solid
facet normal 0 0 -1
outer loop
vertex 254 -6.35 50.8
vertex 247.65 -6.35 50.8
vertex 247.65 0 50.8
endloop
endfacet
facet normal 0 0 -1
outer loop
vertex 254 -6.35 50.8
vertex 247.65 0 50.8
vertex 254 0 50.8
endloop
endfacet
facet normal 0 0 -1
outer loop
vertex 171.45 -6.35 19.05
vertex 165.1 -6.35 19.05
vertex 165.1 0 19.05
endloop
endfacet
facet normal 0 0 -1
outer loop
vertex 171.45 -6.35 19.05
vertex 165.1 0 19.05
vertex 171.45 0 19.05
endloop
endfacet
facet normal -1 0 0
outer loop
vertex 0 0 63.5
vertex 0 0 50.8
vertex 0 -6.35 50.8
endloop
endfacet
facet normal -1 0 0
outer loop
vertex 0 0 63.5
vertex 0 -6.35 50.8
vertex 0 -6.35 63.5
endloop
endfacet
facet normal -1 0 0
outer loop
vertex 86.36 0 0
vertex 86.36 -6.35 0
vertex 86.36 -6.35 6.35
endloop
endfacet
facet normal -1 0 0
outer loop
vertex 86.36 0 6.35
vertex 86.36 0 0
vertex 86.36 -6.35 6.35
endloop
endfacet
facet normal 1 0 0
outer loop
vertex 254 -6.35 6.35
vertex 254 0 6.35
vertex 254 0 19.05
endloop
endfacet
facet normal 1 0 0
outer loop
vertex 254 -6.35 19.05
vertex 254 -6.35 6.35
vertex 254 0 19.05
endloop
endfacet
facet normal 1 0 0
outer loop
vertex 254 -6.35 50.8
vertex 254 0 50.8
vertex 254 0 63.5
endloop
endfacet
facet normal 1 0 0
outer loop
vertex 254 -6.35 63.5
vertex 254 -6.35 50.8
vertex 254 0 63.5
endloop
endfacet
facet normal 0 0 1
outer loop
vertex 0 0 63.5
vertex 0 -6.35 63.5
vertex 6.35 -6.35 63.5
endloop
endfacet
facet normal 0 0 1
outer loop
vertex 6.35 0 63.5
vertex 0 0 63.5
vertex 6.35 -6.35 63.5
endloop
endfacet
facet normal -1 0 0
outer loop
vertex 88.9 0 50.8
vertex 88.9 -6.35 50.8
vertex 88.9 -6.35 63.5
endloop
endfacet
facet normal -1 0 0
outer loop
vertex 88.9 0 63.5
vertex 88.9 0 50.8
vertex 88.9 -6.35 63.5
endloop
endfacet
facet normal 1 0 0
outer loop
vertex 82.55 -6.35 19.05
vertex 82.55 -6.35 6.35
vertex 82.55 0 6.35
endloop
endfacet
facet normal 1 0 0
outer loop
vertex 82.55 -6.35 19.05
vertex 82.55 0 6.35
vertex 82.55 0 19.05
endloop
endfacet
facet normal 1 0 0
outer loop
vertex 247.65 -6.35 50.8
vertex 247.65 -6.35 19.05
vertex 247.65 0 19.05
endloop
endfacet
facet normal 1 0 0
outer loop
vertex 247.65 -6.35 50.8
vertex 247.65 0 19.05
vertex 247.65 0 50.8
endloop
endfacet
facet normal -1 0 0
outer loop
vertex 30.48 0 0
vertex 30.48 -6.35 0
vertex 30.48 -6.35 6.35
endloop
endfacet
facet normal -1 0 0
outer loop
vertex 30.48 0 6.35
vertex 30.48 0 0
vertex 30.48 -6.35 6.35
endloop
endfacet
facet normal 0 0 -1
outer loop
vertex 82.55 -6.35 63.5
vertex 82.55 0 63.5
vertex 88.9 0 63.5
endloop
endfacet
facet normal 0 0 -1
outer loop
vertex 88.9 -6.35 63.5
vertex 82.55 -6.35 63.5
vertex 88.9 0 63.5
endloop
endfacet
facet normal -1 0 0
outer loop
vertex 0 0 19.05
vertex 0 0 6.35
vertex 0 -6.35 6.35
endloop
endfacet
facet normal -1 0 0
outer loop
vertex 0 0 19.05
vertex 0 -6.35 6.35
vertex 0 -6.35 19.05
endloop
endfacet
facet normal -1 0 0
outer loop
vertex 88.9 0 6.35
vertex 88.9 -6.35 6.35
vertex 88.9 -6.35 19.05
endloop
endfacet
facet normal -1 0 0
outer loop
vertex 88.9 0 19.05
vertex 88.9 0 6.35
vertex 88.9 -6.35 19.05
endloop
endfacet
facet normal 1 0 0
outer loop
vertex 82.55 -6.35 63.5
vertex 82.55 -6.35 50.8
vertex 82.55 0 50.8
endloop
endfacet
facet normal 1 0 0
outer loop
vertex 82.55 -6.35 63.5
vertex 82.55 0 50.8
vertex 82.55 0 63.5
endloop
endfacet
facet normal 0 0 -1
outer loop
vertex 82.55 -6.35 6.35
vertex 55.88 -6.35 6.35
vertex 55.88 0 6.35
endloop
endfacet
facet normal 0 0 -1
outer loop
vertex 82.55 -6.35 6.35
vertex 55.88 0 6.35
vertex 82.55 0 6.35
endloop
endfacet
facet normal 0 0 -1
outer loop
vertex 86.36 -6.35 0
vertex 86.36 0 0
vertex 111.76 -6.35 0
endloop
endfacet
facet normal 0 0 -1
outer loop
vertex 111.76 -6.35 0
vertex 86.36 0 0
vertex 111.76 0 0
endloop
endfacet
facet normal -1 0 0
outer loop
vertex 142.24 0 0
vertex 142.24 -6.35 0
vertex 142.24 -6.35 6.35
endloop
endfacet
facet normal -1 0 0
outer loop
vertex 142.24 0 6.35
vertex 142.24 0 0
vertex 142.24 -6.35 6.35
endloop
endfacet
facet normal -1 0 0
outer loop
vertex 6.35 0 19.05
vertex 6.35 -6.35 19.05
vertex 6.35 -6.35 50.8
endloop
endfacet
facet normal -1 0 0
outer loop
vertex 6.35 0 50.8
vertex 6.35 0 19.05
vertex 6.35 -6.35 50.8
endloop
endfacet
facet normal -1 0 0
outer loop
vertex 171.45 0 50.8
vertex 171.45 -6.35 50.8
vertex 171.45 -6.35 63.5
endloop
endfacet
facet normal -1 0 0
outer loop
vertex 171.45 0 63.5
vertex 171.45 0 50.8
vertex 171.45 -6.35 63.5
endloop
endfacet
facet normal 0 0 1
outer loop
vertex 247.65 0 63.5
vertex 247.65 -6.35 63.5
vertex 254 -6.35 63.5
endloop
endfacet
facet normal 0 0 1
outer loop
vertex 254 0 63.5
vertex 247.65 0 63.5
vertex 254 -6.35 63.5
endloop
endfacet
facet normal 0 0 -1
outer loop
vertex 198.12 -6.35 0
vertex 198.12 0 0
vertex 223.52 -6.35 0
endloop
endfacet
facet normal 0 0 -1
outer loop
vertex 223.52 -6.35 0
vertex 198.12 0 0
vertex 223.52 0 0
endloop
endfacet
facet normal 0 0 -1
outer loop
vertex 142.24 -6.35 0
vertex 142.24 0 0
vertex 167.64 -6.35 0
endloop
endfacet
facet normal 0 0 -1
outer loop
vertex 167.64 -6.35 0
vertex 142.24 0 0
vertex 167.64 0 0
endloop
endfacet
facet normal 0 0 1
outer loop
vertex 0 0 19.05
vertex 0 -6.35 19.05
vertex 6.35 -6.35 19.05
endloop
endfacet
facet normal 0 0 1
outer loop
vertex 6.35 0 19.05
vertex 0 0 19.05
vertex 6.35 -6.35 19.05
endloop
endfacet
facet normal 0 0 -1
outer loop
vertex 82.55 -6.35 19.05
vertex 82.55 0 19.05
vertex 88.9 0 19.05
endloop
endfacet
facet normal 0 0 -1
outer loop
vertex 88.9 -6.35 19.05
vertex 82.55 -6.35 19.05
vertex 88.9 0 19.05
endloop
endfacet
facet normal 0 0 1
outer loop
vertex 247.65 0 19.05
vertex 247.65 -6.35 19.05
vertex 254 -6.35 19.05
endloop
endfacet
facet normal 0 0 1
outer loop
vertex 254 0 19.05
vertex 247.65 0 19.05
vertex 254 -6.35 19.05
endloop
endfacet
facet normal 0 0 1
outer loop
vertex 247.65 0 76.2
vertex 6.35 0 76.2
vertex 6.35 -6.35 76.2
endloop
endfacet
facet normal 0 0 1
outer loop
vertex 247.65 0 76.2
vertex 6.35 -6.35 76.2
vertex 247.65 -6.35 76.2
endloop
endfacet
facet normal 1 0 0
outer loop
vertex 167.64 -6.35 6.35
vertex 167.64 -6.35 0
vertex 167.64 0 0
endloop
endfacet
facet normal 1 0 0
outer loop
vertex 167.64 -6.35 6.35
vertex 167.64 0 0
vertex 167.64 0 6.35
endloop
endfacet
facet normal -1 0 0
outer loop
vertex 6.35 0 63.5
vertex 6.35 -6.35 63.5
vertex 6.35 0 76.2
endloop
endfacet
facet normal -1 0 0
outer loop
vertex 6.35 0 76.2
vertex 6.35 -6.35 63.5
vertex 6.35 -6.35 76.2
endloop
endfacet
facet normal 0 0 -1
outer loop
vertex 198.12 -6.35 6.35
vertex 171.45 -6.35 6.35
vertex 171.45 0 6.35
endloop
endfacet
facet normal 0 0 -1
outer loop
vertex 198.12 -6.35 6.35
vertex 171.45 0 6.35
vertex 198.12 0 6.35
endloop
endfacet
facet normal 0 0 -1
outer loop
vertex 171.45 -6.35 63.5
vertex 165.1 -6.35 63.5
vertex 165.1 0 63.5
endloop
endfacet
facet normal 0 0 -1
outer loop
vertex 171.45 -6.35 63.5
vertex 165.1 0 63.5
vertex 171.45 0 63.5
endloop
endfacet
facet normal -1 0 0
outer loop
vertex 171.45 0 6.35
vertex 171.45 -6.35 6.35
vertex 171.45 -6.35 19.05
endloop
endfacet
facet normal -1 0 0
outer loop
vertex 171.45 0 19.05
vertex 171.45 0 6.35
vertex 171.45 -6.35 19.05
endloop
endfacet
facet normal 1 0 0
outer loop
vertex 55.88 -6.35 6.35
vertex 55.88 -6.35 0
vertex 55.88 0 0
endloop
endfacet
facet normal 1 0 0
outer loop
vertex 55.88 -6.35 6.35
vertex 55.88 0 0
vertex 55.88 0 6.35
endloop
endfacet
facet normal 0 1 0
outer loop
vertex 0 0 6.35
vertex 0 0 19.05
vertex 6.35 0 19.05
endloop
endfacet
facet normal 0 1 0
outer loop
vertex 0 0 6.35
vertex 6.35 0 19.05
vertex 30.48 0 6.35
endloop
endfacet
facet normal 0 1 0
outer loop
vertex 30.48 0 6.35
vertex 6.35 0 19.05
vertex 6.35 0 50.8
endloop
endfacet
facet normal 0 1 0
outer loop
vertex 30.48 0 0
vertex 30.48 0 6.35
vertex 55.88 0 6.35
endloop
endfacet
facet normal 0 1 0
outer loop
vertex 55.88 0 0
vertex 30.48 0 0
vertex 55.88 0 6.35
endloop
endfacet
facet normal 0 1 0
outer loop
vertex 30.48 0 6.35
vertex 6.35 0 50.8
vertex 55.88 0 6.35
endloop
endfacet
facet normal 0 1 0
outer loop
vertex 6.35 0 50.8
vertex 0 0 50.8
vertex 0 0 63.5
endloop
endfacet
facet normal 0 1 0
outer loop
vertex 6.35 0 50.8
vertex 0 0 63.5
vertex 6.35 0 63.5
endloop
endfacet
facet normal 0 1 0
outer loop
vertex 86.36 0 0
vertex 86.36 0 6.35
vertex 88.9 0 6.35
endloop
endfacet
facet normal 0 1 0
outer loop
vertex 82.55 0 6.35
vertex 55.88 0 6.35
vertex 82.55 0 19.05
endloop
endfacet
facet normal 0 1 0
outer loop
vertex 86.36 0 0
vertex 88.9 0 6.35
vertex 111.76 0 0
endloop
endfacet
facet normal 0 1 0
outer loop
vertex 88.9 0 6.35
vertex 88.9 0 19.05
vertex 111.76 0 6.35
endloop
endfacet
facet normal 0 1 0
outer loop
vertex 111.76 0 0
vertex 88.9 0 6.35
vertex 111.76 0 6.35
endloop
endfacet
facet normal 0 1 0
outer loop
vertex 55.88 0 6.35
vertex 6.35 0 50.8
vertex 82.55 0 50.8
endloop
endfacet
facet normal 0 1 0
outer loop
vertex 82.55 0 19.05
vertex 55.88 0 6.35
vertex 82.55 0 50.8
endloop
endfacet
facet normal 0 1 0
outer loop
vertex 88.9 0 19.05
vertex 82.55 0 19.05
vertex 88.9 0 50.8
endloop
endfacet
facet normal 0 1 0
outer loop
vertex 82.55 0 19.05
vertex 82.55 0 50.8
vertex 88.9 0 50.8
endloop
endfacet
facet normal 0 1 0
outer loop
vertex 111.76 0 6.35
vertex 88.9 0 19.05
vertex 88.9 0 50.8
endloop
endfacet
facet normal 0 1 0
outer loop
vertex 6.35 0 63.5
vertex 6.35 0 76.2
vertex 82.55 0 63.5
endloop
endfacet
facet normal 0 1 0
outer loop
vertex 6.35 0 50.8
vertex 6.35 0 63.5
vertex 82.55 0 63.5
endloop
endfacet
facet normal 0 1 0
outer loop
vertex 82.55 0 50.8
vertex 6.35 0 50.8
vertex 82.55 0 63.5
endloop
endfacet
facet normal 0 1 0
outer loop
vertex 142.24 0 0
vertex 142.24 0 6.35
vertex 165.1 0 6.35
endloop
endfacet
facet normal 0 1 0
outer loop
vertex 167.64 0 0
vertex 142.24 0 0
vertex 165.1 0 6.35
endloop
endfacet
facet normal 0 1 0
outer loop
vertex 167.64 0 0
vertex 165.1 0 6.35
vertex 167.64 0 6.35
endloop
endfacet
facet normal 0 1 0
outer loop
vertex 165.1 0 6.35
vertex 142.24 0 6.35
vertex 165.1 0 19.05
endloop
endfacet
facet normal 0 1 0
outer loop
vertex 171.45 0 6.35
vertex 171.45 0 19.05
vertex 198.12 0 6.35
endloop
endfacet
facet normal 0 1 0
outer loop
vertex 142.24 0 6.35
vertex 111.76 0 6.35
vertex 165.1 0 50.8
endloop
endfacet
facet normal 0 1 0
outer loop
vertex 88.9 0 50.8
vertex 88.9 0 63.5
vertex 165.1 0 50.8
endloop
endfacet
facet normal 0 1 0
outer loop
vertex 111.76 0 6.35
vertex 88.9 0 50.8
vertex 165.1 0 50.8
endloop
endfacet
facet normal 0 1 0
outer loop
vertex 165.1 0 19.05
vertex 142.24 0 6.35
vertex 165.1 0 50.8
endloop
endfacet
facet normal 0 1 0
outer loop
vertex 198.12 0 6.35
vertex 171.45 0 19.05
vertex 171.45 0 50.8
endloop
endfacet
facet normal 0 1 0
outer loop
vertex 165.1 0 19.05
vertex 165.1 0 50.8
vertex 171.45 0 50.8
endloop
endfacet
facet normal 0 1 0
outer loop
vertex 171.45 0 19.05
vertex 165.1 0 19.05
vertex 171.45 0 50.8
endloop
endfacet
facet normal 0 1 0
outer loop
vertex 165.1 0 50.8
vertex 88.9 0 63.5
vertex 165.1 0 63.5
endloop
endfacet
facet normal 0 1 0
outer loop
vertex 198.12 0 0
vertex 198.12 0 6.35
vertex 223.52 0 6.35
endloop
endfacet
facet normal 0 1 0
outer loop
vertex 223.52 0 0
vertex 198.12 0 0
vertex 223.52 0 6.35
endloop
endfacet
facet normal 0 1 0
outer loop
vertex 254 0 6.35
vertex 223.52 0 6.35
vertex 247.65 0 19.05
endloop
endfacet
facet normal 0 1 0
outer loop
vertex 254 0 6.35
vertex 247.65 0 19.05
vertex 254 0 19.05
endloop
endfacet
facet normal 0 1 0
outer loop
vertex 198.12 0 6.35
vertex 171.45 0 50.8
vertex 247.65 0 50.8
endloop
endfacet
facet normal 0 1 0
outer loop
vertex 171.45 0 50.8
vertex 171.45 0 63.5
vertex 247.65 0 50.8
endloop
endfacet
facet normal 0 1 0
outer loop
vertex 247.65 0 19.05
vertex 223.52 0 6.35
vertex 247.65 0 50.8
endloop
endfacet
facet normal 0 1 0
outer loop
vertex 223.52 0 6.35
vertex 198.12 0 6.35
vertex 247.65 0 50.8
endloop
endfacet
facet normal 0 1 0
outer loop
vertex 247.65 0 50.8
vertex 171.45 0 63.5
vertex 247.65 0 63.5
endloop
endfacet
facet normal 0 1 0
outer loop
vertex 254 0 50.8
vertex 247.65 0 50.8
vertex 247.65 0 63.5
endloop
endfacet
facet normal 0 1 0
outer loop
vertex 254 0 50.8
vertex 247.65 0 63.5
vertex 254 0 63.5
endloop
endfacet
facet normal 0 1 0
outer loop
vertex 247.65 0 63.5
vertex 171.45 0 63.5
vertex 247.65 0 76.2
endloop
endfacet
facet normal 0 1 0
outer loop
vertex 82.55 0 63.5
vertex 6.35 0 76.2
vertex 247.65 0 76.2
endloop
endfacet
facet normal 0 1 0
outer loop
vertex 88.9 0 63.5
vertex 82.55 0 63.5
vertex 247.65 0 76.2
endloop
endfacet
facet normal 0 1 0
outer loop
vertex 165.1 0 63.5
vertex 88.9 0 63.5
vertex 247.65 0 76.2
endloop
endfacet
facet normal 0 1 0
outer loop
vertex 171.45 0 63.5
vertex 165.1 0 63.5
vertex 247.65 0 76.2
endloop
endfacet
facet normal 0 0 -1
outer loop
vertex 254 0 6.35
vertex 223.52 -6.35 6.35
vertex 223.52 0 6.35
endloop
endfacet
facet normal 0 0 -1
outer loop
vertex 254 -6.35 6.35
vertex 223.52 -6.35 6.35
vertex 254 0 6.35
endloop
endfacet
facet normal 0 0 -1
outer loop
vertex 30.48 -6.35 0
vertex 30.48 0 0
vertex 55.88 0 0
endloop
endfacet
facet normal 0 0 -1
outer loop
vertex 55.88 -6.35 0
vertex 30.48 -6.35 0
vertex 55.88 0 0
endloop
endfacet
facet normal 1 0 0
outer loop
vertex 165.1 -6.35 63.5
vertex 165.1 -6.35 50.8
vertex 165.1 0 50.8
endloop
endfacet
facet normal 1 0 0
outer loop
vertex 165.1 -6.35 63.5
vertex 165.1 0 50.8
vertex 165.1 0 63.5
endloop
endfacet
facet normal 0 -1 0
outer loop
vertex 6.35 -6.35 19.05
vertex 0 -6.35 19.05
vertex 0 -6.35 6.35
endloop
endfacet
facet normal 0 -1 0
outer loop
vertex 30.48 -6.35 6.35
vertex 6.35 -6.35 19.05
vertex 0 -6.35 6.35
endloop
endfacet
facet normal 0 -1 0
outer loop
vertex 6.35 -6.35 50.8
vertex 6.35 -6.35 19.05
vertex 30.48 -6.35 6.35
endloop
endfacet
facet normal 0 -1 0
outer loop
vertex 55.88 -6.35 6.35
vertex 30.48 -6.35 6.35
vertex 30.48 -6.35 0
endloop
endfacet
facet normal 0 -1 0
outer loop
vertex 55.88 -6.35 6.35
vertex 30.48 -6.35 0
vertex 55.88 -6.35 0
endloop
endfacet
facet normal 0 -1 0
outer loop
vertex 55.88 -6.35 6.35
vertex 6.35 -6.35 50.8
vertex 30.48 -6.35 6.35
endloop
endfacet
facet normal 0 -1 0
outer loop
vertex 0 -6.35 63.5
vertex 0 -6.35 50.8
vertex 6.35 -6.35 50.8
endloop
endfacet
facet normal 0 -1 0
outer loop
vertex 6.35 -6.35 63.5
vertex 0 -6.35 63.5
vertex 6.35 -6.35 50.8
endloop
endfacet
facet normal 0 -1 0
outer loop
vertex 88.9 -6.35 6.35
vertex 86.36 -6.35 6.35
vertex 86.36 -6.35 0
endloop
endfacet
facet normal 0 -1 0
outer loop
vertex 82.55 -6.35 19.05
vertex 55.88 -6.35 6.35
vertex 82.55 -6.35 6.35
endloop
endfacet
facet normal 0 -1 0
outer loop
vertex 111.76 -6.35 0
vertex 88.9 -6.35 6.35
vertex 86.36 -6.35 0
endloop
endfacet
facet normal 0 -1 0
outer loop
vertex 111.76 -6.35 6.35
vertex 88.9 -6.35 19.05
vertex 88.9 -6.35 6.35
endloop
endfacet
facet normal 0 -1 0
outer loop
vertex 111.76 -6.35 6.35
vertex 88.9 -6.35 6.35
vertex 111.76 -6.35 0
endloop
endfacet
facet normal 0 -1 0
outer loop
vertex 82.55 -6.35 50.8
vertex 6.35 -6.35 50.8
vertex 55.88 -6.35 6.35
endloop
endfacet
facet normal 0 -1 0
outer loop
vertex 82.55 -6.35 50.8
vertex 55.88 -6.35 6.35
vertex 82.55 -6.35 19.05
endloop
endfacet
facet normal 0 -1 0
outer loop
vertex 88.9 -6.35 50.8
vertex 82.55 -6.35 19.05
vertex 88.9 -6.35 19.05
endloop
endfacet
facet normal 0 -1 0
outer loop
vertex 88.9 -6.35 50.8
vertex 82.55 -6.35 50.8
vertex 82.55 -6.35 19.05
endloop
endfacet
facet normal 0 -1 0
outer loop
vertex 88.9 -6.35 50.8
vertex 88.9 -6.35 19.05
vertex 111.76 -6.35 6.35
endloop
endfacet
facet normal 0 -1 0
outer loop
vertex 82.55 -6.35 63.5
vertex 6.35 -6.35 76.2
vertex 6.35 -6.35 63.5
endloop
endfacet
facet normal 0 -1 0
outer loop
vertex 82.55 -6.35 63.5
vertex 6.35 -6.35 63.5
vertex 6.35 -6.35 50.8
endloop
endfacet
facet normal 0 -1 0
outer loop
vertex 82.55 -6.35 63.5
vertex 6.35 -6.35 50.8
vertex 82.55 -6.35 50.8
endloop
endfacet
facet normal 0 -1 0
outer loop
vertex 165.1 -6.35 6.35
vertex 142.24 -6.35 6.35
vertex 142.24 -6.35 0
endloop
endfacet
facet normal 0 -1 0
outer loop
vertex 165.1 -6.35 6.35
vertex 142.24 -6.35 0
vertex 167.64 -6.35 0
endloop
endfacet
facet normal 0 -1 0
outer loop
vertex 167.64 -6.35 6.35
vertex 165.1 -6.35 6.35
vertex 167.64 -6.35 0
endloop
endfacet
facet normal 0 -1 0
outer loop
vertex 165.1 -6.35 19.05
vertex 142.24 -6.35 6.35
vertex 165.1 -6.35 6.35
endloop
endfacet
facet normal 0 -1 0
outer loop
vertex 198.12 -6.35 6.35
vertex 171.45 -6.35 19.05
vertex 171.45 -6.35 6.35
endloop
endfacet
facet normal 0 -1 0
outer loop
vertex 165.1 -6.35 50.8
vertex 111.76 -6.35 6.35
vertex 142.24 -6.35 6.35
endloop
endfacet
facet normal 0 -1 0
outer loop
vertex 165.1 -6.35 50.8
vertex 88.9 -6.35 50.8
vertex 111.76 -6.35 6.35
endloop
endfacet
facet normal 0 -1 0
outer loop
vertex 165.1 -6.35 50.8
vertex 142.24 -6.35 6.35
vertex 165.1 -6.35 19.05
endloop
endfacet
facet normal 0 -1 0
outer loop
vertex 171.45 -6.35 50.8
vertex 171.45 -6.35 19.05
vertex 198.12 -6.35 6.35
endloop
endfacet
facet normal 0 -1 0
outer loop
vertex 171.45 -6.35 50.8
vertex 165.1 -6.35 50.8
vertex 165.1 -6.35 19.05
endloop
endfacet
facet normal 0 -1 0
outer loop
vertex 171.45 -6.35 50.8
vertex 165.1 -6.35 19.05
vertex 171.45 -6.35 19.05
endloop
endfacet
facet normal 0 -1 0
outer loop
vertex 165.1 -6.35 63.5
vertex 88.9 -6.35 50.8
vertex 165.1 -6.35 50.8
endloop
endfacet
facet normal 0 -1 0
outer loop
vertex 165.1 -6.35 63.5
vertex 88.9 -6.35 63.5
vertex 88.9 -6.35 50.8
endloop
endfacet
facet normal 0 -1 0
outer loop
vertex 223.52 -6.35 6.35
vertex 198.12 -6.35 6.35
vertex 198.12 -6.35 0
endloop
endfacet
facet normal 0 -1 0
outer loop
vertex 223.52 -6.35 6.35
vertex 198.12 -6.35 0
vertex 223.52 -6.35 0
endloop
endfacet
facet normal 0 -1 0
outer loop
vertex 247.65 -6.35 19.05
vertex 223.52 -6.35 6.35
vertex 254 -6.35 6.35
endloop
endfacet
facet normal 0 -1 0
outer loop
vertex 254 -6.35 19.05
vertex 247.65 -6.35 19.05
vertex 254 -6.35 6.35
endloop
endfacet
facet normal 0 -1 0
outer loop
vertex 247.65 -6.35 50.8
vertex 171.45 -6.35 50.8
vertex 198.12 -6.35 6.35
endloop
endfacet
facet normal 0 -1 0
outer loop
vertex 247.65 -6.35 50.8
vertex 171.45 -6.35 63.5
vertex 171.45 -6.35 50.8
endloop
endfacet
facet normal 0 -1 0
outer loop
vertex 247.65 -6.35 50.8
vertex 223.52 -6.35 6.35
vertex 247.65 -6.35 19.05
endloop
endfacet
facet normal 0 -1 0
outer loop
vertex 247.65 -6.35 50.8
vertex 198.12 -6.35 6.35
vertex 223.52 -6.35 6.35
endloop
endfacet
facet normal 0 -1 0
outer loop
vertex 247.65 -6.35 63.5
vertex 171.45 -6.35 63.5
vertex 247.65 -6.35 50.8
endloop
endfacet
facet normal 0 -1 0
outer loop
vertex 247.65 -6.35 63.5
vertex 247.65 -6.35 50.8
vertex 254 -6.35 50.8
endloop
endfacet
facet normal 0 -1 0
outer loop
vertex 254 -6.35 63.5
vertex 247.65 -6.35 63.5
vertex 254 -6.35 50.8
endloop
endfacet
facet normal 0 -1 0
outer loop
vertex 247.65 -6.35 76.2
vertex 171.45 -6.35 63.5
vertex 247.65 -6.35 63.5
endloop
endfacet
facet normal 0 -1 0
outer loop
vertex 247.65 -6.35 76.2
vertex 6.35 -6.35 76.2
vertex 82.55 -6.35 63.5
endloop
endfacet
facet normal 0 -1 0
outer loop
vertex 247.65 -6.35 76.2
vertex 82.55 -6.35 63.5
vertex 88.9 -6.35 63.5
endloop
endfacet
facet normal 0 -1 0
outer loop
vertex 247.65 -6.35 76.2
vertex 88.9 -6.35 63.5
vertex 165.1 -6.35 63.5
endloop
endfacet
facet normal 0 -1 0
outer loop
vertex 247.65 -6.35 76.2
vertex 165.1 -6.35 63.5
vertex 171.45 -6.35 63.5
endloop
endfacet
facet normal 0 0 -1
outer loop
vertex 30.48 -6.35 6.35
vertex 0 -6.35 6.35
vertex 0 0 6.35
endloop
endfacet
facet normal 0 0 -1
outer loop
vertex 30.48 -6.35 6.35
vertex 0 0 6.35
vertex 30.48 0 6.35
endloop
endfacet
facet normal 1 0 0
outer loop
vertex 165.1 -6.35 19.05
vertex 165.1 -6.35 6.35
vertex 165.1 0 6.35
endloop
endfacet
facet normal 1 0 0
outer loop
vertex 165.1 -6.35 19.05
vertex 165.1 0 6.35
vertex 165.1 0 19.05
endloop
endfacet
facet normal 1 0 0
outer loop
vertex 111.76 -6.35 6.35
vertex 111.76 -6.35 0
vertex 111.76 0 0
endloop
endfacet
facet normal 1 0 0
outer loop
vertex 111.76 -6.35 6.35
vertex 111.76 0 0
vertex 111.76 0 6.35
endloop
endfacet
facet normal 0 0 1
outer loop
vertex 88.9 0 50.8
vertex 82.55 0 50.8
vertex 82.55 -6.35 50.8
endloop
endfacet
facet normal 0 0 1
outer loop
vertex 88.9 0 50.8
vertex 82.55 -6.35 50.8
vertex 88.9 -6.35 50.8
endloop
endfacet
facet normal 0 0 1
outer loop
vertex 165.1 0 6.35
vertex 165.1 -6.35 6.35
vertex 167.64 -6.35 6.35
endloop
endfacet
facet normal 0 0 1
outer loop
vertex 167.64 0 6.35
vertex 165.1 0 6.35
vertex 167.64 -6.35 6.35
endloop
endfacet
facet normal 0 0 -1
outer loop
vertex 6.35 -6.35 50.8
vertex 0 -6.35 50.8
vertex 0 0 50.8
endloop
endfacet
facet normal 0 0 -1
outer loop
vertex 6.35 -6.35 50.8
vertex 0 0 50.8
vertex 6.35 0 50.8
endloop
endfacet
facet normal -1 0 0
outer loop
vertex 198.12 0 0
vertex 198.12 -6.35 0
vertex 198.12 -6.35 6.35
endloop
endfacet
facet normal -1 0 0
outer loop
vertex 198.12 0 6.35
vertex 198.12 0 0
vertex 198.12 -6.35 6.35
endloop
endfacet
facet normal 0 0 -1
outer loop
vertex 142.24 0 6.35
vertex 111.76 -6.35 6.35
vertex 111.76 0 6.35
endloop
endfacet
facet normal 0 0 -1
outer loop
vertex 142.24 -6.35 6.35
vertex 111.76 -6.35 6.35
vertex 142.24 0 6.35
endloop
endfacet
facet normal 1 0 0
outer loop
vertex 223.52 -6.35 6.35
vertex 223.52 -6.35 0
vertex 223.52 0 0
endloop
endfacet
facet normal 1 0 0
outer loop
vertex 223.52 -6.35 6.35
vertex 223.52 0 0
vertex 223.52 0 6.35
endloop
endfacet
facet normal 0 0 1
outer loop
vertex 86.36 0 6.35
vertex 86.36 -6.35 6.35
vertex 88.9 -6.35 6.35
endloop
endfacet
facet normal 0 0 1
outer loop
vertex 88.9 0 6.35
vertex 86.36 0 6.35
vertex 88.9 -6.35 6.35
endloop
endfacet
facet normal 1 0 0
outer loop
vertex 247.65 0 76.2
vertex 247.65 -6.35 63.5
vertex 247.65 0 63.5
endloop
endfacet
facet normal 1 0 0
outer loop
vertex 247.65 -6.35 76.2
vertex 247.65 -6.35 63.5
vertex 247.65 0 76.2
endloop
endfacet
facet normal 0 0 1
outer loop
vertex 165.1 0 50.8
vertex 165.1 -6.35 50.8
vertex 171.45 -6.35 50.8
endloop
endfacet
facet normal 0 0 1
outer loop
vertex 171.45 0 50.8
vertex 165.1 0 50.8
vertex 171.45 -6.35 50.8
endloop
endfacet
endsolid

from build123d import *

# Parameters (mm, degrees)
F0_W     = 254
F0_H     = 76.2
F1_DEPTH = 6.35
F2_W     = 6.35
F2_H     = 6.35
F2_H_2   = 12.7
F2_H_3   = 31.75
F3_DEPTH = 6.35
F4_W     = 30.48
F4_H     = 6.35
F5_DEPTH = 6.351
F6_W     = 6.35
F6_H     = 12.7
F7_DEPTH = 6.351


with BuildPart() as f1:
    # F0 (on Front) → F1 (new body)
    with BuildSketch(Plane.XZ):
        with Locations((127, 38.1)):
            Rectangle(F0_W, F0_H)
    extrude(amount=F1_DEPTH)

    # F2 (on face) → F3 (cut, through all)
    with BuildSketch(Plane.XZ.offset(6.35)):
        with Locations((3.175, 3.175)):
            Rectangle(F2_W, F2_H)
        with Locations((3.175, 69.85)):
            Rectangle(F2_W, F2_H_2)
        with Locations((3.175, 34.925)):
            Rectangle(F2_W, F2_H_3)
        with Locations((250.825, 3.175)):
            Rectangle(F2_W, F2_H)
        with Locations((250.825, 34.925)):
            Rectangle(F2_W, F2_H_3)
        with Locations((250.825, 69.85)):
            Rectangle(F2_W, F2_H_2)
    extrude(amount=-F3_DEPTH, mode=Mode.SUBTRACT)

    # F4 (on face) → F5 (cut, through all)
    with BuildSketch(Plane.XZ.offset(6.35)):
        with Locations((15.24, 3.175)):
            Rectangle(F4_W, F4_H)
        with Locations((71.12, 3.175)):
            Rectangle(F4_W, F4_H)
        with Locations((127, 3.175)):
            Rectangle(F4_W, F4_H)
        with Locations((182.88, 3.175)):
            Rectangle(F4_W, F4_H)
        with Locations((238.76, 3.175)):
            Rectangle(F4_W, F4_H)
    extrude(amount=-F5_DEPTH, mode=Mode.SUBTRACT)

    # F6 (on face) → F7 (cut, through all)
    with BuildSketch(Plane.XZ.offset(6.35)):
        with Locations((85.725, 12.7)):
            Rectangle(F6_W, F6_H)
        with Locations((85.725, 57.15)):
            Rectangle(F6_W, F6_H)
        with Locations((168.275, 57.15)):
            Rectangle(F6_W, F6_H)
        with Locations((168.275, 12.7)):
            Rectangle(F6_W, F6_H)
    extrude(amount=-F7_DEPTH, mode=Mode.SUBTRACT)


solid = f1.part
